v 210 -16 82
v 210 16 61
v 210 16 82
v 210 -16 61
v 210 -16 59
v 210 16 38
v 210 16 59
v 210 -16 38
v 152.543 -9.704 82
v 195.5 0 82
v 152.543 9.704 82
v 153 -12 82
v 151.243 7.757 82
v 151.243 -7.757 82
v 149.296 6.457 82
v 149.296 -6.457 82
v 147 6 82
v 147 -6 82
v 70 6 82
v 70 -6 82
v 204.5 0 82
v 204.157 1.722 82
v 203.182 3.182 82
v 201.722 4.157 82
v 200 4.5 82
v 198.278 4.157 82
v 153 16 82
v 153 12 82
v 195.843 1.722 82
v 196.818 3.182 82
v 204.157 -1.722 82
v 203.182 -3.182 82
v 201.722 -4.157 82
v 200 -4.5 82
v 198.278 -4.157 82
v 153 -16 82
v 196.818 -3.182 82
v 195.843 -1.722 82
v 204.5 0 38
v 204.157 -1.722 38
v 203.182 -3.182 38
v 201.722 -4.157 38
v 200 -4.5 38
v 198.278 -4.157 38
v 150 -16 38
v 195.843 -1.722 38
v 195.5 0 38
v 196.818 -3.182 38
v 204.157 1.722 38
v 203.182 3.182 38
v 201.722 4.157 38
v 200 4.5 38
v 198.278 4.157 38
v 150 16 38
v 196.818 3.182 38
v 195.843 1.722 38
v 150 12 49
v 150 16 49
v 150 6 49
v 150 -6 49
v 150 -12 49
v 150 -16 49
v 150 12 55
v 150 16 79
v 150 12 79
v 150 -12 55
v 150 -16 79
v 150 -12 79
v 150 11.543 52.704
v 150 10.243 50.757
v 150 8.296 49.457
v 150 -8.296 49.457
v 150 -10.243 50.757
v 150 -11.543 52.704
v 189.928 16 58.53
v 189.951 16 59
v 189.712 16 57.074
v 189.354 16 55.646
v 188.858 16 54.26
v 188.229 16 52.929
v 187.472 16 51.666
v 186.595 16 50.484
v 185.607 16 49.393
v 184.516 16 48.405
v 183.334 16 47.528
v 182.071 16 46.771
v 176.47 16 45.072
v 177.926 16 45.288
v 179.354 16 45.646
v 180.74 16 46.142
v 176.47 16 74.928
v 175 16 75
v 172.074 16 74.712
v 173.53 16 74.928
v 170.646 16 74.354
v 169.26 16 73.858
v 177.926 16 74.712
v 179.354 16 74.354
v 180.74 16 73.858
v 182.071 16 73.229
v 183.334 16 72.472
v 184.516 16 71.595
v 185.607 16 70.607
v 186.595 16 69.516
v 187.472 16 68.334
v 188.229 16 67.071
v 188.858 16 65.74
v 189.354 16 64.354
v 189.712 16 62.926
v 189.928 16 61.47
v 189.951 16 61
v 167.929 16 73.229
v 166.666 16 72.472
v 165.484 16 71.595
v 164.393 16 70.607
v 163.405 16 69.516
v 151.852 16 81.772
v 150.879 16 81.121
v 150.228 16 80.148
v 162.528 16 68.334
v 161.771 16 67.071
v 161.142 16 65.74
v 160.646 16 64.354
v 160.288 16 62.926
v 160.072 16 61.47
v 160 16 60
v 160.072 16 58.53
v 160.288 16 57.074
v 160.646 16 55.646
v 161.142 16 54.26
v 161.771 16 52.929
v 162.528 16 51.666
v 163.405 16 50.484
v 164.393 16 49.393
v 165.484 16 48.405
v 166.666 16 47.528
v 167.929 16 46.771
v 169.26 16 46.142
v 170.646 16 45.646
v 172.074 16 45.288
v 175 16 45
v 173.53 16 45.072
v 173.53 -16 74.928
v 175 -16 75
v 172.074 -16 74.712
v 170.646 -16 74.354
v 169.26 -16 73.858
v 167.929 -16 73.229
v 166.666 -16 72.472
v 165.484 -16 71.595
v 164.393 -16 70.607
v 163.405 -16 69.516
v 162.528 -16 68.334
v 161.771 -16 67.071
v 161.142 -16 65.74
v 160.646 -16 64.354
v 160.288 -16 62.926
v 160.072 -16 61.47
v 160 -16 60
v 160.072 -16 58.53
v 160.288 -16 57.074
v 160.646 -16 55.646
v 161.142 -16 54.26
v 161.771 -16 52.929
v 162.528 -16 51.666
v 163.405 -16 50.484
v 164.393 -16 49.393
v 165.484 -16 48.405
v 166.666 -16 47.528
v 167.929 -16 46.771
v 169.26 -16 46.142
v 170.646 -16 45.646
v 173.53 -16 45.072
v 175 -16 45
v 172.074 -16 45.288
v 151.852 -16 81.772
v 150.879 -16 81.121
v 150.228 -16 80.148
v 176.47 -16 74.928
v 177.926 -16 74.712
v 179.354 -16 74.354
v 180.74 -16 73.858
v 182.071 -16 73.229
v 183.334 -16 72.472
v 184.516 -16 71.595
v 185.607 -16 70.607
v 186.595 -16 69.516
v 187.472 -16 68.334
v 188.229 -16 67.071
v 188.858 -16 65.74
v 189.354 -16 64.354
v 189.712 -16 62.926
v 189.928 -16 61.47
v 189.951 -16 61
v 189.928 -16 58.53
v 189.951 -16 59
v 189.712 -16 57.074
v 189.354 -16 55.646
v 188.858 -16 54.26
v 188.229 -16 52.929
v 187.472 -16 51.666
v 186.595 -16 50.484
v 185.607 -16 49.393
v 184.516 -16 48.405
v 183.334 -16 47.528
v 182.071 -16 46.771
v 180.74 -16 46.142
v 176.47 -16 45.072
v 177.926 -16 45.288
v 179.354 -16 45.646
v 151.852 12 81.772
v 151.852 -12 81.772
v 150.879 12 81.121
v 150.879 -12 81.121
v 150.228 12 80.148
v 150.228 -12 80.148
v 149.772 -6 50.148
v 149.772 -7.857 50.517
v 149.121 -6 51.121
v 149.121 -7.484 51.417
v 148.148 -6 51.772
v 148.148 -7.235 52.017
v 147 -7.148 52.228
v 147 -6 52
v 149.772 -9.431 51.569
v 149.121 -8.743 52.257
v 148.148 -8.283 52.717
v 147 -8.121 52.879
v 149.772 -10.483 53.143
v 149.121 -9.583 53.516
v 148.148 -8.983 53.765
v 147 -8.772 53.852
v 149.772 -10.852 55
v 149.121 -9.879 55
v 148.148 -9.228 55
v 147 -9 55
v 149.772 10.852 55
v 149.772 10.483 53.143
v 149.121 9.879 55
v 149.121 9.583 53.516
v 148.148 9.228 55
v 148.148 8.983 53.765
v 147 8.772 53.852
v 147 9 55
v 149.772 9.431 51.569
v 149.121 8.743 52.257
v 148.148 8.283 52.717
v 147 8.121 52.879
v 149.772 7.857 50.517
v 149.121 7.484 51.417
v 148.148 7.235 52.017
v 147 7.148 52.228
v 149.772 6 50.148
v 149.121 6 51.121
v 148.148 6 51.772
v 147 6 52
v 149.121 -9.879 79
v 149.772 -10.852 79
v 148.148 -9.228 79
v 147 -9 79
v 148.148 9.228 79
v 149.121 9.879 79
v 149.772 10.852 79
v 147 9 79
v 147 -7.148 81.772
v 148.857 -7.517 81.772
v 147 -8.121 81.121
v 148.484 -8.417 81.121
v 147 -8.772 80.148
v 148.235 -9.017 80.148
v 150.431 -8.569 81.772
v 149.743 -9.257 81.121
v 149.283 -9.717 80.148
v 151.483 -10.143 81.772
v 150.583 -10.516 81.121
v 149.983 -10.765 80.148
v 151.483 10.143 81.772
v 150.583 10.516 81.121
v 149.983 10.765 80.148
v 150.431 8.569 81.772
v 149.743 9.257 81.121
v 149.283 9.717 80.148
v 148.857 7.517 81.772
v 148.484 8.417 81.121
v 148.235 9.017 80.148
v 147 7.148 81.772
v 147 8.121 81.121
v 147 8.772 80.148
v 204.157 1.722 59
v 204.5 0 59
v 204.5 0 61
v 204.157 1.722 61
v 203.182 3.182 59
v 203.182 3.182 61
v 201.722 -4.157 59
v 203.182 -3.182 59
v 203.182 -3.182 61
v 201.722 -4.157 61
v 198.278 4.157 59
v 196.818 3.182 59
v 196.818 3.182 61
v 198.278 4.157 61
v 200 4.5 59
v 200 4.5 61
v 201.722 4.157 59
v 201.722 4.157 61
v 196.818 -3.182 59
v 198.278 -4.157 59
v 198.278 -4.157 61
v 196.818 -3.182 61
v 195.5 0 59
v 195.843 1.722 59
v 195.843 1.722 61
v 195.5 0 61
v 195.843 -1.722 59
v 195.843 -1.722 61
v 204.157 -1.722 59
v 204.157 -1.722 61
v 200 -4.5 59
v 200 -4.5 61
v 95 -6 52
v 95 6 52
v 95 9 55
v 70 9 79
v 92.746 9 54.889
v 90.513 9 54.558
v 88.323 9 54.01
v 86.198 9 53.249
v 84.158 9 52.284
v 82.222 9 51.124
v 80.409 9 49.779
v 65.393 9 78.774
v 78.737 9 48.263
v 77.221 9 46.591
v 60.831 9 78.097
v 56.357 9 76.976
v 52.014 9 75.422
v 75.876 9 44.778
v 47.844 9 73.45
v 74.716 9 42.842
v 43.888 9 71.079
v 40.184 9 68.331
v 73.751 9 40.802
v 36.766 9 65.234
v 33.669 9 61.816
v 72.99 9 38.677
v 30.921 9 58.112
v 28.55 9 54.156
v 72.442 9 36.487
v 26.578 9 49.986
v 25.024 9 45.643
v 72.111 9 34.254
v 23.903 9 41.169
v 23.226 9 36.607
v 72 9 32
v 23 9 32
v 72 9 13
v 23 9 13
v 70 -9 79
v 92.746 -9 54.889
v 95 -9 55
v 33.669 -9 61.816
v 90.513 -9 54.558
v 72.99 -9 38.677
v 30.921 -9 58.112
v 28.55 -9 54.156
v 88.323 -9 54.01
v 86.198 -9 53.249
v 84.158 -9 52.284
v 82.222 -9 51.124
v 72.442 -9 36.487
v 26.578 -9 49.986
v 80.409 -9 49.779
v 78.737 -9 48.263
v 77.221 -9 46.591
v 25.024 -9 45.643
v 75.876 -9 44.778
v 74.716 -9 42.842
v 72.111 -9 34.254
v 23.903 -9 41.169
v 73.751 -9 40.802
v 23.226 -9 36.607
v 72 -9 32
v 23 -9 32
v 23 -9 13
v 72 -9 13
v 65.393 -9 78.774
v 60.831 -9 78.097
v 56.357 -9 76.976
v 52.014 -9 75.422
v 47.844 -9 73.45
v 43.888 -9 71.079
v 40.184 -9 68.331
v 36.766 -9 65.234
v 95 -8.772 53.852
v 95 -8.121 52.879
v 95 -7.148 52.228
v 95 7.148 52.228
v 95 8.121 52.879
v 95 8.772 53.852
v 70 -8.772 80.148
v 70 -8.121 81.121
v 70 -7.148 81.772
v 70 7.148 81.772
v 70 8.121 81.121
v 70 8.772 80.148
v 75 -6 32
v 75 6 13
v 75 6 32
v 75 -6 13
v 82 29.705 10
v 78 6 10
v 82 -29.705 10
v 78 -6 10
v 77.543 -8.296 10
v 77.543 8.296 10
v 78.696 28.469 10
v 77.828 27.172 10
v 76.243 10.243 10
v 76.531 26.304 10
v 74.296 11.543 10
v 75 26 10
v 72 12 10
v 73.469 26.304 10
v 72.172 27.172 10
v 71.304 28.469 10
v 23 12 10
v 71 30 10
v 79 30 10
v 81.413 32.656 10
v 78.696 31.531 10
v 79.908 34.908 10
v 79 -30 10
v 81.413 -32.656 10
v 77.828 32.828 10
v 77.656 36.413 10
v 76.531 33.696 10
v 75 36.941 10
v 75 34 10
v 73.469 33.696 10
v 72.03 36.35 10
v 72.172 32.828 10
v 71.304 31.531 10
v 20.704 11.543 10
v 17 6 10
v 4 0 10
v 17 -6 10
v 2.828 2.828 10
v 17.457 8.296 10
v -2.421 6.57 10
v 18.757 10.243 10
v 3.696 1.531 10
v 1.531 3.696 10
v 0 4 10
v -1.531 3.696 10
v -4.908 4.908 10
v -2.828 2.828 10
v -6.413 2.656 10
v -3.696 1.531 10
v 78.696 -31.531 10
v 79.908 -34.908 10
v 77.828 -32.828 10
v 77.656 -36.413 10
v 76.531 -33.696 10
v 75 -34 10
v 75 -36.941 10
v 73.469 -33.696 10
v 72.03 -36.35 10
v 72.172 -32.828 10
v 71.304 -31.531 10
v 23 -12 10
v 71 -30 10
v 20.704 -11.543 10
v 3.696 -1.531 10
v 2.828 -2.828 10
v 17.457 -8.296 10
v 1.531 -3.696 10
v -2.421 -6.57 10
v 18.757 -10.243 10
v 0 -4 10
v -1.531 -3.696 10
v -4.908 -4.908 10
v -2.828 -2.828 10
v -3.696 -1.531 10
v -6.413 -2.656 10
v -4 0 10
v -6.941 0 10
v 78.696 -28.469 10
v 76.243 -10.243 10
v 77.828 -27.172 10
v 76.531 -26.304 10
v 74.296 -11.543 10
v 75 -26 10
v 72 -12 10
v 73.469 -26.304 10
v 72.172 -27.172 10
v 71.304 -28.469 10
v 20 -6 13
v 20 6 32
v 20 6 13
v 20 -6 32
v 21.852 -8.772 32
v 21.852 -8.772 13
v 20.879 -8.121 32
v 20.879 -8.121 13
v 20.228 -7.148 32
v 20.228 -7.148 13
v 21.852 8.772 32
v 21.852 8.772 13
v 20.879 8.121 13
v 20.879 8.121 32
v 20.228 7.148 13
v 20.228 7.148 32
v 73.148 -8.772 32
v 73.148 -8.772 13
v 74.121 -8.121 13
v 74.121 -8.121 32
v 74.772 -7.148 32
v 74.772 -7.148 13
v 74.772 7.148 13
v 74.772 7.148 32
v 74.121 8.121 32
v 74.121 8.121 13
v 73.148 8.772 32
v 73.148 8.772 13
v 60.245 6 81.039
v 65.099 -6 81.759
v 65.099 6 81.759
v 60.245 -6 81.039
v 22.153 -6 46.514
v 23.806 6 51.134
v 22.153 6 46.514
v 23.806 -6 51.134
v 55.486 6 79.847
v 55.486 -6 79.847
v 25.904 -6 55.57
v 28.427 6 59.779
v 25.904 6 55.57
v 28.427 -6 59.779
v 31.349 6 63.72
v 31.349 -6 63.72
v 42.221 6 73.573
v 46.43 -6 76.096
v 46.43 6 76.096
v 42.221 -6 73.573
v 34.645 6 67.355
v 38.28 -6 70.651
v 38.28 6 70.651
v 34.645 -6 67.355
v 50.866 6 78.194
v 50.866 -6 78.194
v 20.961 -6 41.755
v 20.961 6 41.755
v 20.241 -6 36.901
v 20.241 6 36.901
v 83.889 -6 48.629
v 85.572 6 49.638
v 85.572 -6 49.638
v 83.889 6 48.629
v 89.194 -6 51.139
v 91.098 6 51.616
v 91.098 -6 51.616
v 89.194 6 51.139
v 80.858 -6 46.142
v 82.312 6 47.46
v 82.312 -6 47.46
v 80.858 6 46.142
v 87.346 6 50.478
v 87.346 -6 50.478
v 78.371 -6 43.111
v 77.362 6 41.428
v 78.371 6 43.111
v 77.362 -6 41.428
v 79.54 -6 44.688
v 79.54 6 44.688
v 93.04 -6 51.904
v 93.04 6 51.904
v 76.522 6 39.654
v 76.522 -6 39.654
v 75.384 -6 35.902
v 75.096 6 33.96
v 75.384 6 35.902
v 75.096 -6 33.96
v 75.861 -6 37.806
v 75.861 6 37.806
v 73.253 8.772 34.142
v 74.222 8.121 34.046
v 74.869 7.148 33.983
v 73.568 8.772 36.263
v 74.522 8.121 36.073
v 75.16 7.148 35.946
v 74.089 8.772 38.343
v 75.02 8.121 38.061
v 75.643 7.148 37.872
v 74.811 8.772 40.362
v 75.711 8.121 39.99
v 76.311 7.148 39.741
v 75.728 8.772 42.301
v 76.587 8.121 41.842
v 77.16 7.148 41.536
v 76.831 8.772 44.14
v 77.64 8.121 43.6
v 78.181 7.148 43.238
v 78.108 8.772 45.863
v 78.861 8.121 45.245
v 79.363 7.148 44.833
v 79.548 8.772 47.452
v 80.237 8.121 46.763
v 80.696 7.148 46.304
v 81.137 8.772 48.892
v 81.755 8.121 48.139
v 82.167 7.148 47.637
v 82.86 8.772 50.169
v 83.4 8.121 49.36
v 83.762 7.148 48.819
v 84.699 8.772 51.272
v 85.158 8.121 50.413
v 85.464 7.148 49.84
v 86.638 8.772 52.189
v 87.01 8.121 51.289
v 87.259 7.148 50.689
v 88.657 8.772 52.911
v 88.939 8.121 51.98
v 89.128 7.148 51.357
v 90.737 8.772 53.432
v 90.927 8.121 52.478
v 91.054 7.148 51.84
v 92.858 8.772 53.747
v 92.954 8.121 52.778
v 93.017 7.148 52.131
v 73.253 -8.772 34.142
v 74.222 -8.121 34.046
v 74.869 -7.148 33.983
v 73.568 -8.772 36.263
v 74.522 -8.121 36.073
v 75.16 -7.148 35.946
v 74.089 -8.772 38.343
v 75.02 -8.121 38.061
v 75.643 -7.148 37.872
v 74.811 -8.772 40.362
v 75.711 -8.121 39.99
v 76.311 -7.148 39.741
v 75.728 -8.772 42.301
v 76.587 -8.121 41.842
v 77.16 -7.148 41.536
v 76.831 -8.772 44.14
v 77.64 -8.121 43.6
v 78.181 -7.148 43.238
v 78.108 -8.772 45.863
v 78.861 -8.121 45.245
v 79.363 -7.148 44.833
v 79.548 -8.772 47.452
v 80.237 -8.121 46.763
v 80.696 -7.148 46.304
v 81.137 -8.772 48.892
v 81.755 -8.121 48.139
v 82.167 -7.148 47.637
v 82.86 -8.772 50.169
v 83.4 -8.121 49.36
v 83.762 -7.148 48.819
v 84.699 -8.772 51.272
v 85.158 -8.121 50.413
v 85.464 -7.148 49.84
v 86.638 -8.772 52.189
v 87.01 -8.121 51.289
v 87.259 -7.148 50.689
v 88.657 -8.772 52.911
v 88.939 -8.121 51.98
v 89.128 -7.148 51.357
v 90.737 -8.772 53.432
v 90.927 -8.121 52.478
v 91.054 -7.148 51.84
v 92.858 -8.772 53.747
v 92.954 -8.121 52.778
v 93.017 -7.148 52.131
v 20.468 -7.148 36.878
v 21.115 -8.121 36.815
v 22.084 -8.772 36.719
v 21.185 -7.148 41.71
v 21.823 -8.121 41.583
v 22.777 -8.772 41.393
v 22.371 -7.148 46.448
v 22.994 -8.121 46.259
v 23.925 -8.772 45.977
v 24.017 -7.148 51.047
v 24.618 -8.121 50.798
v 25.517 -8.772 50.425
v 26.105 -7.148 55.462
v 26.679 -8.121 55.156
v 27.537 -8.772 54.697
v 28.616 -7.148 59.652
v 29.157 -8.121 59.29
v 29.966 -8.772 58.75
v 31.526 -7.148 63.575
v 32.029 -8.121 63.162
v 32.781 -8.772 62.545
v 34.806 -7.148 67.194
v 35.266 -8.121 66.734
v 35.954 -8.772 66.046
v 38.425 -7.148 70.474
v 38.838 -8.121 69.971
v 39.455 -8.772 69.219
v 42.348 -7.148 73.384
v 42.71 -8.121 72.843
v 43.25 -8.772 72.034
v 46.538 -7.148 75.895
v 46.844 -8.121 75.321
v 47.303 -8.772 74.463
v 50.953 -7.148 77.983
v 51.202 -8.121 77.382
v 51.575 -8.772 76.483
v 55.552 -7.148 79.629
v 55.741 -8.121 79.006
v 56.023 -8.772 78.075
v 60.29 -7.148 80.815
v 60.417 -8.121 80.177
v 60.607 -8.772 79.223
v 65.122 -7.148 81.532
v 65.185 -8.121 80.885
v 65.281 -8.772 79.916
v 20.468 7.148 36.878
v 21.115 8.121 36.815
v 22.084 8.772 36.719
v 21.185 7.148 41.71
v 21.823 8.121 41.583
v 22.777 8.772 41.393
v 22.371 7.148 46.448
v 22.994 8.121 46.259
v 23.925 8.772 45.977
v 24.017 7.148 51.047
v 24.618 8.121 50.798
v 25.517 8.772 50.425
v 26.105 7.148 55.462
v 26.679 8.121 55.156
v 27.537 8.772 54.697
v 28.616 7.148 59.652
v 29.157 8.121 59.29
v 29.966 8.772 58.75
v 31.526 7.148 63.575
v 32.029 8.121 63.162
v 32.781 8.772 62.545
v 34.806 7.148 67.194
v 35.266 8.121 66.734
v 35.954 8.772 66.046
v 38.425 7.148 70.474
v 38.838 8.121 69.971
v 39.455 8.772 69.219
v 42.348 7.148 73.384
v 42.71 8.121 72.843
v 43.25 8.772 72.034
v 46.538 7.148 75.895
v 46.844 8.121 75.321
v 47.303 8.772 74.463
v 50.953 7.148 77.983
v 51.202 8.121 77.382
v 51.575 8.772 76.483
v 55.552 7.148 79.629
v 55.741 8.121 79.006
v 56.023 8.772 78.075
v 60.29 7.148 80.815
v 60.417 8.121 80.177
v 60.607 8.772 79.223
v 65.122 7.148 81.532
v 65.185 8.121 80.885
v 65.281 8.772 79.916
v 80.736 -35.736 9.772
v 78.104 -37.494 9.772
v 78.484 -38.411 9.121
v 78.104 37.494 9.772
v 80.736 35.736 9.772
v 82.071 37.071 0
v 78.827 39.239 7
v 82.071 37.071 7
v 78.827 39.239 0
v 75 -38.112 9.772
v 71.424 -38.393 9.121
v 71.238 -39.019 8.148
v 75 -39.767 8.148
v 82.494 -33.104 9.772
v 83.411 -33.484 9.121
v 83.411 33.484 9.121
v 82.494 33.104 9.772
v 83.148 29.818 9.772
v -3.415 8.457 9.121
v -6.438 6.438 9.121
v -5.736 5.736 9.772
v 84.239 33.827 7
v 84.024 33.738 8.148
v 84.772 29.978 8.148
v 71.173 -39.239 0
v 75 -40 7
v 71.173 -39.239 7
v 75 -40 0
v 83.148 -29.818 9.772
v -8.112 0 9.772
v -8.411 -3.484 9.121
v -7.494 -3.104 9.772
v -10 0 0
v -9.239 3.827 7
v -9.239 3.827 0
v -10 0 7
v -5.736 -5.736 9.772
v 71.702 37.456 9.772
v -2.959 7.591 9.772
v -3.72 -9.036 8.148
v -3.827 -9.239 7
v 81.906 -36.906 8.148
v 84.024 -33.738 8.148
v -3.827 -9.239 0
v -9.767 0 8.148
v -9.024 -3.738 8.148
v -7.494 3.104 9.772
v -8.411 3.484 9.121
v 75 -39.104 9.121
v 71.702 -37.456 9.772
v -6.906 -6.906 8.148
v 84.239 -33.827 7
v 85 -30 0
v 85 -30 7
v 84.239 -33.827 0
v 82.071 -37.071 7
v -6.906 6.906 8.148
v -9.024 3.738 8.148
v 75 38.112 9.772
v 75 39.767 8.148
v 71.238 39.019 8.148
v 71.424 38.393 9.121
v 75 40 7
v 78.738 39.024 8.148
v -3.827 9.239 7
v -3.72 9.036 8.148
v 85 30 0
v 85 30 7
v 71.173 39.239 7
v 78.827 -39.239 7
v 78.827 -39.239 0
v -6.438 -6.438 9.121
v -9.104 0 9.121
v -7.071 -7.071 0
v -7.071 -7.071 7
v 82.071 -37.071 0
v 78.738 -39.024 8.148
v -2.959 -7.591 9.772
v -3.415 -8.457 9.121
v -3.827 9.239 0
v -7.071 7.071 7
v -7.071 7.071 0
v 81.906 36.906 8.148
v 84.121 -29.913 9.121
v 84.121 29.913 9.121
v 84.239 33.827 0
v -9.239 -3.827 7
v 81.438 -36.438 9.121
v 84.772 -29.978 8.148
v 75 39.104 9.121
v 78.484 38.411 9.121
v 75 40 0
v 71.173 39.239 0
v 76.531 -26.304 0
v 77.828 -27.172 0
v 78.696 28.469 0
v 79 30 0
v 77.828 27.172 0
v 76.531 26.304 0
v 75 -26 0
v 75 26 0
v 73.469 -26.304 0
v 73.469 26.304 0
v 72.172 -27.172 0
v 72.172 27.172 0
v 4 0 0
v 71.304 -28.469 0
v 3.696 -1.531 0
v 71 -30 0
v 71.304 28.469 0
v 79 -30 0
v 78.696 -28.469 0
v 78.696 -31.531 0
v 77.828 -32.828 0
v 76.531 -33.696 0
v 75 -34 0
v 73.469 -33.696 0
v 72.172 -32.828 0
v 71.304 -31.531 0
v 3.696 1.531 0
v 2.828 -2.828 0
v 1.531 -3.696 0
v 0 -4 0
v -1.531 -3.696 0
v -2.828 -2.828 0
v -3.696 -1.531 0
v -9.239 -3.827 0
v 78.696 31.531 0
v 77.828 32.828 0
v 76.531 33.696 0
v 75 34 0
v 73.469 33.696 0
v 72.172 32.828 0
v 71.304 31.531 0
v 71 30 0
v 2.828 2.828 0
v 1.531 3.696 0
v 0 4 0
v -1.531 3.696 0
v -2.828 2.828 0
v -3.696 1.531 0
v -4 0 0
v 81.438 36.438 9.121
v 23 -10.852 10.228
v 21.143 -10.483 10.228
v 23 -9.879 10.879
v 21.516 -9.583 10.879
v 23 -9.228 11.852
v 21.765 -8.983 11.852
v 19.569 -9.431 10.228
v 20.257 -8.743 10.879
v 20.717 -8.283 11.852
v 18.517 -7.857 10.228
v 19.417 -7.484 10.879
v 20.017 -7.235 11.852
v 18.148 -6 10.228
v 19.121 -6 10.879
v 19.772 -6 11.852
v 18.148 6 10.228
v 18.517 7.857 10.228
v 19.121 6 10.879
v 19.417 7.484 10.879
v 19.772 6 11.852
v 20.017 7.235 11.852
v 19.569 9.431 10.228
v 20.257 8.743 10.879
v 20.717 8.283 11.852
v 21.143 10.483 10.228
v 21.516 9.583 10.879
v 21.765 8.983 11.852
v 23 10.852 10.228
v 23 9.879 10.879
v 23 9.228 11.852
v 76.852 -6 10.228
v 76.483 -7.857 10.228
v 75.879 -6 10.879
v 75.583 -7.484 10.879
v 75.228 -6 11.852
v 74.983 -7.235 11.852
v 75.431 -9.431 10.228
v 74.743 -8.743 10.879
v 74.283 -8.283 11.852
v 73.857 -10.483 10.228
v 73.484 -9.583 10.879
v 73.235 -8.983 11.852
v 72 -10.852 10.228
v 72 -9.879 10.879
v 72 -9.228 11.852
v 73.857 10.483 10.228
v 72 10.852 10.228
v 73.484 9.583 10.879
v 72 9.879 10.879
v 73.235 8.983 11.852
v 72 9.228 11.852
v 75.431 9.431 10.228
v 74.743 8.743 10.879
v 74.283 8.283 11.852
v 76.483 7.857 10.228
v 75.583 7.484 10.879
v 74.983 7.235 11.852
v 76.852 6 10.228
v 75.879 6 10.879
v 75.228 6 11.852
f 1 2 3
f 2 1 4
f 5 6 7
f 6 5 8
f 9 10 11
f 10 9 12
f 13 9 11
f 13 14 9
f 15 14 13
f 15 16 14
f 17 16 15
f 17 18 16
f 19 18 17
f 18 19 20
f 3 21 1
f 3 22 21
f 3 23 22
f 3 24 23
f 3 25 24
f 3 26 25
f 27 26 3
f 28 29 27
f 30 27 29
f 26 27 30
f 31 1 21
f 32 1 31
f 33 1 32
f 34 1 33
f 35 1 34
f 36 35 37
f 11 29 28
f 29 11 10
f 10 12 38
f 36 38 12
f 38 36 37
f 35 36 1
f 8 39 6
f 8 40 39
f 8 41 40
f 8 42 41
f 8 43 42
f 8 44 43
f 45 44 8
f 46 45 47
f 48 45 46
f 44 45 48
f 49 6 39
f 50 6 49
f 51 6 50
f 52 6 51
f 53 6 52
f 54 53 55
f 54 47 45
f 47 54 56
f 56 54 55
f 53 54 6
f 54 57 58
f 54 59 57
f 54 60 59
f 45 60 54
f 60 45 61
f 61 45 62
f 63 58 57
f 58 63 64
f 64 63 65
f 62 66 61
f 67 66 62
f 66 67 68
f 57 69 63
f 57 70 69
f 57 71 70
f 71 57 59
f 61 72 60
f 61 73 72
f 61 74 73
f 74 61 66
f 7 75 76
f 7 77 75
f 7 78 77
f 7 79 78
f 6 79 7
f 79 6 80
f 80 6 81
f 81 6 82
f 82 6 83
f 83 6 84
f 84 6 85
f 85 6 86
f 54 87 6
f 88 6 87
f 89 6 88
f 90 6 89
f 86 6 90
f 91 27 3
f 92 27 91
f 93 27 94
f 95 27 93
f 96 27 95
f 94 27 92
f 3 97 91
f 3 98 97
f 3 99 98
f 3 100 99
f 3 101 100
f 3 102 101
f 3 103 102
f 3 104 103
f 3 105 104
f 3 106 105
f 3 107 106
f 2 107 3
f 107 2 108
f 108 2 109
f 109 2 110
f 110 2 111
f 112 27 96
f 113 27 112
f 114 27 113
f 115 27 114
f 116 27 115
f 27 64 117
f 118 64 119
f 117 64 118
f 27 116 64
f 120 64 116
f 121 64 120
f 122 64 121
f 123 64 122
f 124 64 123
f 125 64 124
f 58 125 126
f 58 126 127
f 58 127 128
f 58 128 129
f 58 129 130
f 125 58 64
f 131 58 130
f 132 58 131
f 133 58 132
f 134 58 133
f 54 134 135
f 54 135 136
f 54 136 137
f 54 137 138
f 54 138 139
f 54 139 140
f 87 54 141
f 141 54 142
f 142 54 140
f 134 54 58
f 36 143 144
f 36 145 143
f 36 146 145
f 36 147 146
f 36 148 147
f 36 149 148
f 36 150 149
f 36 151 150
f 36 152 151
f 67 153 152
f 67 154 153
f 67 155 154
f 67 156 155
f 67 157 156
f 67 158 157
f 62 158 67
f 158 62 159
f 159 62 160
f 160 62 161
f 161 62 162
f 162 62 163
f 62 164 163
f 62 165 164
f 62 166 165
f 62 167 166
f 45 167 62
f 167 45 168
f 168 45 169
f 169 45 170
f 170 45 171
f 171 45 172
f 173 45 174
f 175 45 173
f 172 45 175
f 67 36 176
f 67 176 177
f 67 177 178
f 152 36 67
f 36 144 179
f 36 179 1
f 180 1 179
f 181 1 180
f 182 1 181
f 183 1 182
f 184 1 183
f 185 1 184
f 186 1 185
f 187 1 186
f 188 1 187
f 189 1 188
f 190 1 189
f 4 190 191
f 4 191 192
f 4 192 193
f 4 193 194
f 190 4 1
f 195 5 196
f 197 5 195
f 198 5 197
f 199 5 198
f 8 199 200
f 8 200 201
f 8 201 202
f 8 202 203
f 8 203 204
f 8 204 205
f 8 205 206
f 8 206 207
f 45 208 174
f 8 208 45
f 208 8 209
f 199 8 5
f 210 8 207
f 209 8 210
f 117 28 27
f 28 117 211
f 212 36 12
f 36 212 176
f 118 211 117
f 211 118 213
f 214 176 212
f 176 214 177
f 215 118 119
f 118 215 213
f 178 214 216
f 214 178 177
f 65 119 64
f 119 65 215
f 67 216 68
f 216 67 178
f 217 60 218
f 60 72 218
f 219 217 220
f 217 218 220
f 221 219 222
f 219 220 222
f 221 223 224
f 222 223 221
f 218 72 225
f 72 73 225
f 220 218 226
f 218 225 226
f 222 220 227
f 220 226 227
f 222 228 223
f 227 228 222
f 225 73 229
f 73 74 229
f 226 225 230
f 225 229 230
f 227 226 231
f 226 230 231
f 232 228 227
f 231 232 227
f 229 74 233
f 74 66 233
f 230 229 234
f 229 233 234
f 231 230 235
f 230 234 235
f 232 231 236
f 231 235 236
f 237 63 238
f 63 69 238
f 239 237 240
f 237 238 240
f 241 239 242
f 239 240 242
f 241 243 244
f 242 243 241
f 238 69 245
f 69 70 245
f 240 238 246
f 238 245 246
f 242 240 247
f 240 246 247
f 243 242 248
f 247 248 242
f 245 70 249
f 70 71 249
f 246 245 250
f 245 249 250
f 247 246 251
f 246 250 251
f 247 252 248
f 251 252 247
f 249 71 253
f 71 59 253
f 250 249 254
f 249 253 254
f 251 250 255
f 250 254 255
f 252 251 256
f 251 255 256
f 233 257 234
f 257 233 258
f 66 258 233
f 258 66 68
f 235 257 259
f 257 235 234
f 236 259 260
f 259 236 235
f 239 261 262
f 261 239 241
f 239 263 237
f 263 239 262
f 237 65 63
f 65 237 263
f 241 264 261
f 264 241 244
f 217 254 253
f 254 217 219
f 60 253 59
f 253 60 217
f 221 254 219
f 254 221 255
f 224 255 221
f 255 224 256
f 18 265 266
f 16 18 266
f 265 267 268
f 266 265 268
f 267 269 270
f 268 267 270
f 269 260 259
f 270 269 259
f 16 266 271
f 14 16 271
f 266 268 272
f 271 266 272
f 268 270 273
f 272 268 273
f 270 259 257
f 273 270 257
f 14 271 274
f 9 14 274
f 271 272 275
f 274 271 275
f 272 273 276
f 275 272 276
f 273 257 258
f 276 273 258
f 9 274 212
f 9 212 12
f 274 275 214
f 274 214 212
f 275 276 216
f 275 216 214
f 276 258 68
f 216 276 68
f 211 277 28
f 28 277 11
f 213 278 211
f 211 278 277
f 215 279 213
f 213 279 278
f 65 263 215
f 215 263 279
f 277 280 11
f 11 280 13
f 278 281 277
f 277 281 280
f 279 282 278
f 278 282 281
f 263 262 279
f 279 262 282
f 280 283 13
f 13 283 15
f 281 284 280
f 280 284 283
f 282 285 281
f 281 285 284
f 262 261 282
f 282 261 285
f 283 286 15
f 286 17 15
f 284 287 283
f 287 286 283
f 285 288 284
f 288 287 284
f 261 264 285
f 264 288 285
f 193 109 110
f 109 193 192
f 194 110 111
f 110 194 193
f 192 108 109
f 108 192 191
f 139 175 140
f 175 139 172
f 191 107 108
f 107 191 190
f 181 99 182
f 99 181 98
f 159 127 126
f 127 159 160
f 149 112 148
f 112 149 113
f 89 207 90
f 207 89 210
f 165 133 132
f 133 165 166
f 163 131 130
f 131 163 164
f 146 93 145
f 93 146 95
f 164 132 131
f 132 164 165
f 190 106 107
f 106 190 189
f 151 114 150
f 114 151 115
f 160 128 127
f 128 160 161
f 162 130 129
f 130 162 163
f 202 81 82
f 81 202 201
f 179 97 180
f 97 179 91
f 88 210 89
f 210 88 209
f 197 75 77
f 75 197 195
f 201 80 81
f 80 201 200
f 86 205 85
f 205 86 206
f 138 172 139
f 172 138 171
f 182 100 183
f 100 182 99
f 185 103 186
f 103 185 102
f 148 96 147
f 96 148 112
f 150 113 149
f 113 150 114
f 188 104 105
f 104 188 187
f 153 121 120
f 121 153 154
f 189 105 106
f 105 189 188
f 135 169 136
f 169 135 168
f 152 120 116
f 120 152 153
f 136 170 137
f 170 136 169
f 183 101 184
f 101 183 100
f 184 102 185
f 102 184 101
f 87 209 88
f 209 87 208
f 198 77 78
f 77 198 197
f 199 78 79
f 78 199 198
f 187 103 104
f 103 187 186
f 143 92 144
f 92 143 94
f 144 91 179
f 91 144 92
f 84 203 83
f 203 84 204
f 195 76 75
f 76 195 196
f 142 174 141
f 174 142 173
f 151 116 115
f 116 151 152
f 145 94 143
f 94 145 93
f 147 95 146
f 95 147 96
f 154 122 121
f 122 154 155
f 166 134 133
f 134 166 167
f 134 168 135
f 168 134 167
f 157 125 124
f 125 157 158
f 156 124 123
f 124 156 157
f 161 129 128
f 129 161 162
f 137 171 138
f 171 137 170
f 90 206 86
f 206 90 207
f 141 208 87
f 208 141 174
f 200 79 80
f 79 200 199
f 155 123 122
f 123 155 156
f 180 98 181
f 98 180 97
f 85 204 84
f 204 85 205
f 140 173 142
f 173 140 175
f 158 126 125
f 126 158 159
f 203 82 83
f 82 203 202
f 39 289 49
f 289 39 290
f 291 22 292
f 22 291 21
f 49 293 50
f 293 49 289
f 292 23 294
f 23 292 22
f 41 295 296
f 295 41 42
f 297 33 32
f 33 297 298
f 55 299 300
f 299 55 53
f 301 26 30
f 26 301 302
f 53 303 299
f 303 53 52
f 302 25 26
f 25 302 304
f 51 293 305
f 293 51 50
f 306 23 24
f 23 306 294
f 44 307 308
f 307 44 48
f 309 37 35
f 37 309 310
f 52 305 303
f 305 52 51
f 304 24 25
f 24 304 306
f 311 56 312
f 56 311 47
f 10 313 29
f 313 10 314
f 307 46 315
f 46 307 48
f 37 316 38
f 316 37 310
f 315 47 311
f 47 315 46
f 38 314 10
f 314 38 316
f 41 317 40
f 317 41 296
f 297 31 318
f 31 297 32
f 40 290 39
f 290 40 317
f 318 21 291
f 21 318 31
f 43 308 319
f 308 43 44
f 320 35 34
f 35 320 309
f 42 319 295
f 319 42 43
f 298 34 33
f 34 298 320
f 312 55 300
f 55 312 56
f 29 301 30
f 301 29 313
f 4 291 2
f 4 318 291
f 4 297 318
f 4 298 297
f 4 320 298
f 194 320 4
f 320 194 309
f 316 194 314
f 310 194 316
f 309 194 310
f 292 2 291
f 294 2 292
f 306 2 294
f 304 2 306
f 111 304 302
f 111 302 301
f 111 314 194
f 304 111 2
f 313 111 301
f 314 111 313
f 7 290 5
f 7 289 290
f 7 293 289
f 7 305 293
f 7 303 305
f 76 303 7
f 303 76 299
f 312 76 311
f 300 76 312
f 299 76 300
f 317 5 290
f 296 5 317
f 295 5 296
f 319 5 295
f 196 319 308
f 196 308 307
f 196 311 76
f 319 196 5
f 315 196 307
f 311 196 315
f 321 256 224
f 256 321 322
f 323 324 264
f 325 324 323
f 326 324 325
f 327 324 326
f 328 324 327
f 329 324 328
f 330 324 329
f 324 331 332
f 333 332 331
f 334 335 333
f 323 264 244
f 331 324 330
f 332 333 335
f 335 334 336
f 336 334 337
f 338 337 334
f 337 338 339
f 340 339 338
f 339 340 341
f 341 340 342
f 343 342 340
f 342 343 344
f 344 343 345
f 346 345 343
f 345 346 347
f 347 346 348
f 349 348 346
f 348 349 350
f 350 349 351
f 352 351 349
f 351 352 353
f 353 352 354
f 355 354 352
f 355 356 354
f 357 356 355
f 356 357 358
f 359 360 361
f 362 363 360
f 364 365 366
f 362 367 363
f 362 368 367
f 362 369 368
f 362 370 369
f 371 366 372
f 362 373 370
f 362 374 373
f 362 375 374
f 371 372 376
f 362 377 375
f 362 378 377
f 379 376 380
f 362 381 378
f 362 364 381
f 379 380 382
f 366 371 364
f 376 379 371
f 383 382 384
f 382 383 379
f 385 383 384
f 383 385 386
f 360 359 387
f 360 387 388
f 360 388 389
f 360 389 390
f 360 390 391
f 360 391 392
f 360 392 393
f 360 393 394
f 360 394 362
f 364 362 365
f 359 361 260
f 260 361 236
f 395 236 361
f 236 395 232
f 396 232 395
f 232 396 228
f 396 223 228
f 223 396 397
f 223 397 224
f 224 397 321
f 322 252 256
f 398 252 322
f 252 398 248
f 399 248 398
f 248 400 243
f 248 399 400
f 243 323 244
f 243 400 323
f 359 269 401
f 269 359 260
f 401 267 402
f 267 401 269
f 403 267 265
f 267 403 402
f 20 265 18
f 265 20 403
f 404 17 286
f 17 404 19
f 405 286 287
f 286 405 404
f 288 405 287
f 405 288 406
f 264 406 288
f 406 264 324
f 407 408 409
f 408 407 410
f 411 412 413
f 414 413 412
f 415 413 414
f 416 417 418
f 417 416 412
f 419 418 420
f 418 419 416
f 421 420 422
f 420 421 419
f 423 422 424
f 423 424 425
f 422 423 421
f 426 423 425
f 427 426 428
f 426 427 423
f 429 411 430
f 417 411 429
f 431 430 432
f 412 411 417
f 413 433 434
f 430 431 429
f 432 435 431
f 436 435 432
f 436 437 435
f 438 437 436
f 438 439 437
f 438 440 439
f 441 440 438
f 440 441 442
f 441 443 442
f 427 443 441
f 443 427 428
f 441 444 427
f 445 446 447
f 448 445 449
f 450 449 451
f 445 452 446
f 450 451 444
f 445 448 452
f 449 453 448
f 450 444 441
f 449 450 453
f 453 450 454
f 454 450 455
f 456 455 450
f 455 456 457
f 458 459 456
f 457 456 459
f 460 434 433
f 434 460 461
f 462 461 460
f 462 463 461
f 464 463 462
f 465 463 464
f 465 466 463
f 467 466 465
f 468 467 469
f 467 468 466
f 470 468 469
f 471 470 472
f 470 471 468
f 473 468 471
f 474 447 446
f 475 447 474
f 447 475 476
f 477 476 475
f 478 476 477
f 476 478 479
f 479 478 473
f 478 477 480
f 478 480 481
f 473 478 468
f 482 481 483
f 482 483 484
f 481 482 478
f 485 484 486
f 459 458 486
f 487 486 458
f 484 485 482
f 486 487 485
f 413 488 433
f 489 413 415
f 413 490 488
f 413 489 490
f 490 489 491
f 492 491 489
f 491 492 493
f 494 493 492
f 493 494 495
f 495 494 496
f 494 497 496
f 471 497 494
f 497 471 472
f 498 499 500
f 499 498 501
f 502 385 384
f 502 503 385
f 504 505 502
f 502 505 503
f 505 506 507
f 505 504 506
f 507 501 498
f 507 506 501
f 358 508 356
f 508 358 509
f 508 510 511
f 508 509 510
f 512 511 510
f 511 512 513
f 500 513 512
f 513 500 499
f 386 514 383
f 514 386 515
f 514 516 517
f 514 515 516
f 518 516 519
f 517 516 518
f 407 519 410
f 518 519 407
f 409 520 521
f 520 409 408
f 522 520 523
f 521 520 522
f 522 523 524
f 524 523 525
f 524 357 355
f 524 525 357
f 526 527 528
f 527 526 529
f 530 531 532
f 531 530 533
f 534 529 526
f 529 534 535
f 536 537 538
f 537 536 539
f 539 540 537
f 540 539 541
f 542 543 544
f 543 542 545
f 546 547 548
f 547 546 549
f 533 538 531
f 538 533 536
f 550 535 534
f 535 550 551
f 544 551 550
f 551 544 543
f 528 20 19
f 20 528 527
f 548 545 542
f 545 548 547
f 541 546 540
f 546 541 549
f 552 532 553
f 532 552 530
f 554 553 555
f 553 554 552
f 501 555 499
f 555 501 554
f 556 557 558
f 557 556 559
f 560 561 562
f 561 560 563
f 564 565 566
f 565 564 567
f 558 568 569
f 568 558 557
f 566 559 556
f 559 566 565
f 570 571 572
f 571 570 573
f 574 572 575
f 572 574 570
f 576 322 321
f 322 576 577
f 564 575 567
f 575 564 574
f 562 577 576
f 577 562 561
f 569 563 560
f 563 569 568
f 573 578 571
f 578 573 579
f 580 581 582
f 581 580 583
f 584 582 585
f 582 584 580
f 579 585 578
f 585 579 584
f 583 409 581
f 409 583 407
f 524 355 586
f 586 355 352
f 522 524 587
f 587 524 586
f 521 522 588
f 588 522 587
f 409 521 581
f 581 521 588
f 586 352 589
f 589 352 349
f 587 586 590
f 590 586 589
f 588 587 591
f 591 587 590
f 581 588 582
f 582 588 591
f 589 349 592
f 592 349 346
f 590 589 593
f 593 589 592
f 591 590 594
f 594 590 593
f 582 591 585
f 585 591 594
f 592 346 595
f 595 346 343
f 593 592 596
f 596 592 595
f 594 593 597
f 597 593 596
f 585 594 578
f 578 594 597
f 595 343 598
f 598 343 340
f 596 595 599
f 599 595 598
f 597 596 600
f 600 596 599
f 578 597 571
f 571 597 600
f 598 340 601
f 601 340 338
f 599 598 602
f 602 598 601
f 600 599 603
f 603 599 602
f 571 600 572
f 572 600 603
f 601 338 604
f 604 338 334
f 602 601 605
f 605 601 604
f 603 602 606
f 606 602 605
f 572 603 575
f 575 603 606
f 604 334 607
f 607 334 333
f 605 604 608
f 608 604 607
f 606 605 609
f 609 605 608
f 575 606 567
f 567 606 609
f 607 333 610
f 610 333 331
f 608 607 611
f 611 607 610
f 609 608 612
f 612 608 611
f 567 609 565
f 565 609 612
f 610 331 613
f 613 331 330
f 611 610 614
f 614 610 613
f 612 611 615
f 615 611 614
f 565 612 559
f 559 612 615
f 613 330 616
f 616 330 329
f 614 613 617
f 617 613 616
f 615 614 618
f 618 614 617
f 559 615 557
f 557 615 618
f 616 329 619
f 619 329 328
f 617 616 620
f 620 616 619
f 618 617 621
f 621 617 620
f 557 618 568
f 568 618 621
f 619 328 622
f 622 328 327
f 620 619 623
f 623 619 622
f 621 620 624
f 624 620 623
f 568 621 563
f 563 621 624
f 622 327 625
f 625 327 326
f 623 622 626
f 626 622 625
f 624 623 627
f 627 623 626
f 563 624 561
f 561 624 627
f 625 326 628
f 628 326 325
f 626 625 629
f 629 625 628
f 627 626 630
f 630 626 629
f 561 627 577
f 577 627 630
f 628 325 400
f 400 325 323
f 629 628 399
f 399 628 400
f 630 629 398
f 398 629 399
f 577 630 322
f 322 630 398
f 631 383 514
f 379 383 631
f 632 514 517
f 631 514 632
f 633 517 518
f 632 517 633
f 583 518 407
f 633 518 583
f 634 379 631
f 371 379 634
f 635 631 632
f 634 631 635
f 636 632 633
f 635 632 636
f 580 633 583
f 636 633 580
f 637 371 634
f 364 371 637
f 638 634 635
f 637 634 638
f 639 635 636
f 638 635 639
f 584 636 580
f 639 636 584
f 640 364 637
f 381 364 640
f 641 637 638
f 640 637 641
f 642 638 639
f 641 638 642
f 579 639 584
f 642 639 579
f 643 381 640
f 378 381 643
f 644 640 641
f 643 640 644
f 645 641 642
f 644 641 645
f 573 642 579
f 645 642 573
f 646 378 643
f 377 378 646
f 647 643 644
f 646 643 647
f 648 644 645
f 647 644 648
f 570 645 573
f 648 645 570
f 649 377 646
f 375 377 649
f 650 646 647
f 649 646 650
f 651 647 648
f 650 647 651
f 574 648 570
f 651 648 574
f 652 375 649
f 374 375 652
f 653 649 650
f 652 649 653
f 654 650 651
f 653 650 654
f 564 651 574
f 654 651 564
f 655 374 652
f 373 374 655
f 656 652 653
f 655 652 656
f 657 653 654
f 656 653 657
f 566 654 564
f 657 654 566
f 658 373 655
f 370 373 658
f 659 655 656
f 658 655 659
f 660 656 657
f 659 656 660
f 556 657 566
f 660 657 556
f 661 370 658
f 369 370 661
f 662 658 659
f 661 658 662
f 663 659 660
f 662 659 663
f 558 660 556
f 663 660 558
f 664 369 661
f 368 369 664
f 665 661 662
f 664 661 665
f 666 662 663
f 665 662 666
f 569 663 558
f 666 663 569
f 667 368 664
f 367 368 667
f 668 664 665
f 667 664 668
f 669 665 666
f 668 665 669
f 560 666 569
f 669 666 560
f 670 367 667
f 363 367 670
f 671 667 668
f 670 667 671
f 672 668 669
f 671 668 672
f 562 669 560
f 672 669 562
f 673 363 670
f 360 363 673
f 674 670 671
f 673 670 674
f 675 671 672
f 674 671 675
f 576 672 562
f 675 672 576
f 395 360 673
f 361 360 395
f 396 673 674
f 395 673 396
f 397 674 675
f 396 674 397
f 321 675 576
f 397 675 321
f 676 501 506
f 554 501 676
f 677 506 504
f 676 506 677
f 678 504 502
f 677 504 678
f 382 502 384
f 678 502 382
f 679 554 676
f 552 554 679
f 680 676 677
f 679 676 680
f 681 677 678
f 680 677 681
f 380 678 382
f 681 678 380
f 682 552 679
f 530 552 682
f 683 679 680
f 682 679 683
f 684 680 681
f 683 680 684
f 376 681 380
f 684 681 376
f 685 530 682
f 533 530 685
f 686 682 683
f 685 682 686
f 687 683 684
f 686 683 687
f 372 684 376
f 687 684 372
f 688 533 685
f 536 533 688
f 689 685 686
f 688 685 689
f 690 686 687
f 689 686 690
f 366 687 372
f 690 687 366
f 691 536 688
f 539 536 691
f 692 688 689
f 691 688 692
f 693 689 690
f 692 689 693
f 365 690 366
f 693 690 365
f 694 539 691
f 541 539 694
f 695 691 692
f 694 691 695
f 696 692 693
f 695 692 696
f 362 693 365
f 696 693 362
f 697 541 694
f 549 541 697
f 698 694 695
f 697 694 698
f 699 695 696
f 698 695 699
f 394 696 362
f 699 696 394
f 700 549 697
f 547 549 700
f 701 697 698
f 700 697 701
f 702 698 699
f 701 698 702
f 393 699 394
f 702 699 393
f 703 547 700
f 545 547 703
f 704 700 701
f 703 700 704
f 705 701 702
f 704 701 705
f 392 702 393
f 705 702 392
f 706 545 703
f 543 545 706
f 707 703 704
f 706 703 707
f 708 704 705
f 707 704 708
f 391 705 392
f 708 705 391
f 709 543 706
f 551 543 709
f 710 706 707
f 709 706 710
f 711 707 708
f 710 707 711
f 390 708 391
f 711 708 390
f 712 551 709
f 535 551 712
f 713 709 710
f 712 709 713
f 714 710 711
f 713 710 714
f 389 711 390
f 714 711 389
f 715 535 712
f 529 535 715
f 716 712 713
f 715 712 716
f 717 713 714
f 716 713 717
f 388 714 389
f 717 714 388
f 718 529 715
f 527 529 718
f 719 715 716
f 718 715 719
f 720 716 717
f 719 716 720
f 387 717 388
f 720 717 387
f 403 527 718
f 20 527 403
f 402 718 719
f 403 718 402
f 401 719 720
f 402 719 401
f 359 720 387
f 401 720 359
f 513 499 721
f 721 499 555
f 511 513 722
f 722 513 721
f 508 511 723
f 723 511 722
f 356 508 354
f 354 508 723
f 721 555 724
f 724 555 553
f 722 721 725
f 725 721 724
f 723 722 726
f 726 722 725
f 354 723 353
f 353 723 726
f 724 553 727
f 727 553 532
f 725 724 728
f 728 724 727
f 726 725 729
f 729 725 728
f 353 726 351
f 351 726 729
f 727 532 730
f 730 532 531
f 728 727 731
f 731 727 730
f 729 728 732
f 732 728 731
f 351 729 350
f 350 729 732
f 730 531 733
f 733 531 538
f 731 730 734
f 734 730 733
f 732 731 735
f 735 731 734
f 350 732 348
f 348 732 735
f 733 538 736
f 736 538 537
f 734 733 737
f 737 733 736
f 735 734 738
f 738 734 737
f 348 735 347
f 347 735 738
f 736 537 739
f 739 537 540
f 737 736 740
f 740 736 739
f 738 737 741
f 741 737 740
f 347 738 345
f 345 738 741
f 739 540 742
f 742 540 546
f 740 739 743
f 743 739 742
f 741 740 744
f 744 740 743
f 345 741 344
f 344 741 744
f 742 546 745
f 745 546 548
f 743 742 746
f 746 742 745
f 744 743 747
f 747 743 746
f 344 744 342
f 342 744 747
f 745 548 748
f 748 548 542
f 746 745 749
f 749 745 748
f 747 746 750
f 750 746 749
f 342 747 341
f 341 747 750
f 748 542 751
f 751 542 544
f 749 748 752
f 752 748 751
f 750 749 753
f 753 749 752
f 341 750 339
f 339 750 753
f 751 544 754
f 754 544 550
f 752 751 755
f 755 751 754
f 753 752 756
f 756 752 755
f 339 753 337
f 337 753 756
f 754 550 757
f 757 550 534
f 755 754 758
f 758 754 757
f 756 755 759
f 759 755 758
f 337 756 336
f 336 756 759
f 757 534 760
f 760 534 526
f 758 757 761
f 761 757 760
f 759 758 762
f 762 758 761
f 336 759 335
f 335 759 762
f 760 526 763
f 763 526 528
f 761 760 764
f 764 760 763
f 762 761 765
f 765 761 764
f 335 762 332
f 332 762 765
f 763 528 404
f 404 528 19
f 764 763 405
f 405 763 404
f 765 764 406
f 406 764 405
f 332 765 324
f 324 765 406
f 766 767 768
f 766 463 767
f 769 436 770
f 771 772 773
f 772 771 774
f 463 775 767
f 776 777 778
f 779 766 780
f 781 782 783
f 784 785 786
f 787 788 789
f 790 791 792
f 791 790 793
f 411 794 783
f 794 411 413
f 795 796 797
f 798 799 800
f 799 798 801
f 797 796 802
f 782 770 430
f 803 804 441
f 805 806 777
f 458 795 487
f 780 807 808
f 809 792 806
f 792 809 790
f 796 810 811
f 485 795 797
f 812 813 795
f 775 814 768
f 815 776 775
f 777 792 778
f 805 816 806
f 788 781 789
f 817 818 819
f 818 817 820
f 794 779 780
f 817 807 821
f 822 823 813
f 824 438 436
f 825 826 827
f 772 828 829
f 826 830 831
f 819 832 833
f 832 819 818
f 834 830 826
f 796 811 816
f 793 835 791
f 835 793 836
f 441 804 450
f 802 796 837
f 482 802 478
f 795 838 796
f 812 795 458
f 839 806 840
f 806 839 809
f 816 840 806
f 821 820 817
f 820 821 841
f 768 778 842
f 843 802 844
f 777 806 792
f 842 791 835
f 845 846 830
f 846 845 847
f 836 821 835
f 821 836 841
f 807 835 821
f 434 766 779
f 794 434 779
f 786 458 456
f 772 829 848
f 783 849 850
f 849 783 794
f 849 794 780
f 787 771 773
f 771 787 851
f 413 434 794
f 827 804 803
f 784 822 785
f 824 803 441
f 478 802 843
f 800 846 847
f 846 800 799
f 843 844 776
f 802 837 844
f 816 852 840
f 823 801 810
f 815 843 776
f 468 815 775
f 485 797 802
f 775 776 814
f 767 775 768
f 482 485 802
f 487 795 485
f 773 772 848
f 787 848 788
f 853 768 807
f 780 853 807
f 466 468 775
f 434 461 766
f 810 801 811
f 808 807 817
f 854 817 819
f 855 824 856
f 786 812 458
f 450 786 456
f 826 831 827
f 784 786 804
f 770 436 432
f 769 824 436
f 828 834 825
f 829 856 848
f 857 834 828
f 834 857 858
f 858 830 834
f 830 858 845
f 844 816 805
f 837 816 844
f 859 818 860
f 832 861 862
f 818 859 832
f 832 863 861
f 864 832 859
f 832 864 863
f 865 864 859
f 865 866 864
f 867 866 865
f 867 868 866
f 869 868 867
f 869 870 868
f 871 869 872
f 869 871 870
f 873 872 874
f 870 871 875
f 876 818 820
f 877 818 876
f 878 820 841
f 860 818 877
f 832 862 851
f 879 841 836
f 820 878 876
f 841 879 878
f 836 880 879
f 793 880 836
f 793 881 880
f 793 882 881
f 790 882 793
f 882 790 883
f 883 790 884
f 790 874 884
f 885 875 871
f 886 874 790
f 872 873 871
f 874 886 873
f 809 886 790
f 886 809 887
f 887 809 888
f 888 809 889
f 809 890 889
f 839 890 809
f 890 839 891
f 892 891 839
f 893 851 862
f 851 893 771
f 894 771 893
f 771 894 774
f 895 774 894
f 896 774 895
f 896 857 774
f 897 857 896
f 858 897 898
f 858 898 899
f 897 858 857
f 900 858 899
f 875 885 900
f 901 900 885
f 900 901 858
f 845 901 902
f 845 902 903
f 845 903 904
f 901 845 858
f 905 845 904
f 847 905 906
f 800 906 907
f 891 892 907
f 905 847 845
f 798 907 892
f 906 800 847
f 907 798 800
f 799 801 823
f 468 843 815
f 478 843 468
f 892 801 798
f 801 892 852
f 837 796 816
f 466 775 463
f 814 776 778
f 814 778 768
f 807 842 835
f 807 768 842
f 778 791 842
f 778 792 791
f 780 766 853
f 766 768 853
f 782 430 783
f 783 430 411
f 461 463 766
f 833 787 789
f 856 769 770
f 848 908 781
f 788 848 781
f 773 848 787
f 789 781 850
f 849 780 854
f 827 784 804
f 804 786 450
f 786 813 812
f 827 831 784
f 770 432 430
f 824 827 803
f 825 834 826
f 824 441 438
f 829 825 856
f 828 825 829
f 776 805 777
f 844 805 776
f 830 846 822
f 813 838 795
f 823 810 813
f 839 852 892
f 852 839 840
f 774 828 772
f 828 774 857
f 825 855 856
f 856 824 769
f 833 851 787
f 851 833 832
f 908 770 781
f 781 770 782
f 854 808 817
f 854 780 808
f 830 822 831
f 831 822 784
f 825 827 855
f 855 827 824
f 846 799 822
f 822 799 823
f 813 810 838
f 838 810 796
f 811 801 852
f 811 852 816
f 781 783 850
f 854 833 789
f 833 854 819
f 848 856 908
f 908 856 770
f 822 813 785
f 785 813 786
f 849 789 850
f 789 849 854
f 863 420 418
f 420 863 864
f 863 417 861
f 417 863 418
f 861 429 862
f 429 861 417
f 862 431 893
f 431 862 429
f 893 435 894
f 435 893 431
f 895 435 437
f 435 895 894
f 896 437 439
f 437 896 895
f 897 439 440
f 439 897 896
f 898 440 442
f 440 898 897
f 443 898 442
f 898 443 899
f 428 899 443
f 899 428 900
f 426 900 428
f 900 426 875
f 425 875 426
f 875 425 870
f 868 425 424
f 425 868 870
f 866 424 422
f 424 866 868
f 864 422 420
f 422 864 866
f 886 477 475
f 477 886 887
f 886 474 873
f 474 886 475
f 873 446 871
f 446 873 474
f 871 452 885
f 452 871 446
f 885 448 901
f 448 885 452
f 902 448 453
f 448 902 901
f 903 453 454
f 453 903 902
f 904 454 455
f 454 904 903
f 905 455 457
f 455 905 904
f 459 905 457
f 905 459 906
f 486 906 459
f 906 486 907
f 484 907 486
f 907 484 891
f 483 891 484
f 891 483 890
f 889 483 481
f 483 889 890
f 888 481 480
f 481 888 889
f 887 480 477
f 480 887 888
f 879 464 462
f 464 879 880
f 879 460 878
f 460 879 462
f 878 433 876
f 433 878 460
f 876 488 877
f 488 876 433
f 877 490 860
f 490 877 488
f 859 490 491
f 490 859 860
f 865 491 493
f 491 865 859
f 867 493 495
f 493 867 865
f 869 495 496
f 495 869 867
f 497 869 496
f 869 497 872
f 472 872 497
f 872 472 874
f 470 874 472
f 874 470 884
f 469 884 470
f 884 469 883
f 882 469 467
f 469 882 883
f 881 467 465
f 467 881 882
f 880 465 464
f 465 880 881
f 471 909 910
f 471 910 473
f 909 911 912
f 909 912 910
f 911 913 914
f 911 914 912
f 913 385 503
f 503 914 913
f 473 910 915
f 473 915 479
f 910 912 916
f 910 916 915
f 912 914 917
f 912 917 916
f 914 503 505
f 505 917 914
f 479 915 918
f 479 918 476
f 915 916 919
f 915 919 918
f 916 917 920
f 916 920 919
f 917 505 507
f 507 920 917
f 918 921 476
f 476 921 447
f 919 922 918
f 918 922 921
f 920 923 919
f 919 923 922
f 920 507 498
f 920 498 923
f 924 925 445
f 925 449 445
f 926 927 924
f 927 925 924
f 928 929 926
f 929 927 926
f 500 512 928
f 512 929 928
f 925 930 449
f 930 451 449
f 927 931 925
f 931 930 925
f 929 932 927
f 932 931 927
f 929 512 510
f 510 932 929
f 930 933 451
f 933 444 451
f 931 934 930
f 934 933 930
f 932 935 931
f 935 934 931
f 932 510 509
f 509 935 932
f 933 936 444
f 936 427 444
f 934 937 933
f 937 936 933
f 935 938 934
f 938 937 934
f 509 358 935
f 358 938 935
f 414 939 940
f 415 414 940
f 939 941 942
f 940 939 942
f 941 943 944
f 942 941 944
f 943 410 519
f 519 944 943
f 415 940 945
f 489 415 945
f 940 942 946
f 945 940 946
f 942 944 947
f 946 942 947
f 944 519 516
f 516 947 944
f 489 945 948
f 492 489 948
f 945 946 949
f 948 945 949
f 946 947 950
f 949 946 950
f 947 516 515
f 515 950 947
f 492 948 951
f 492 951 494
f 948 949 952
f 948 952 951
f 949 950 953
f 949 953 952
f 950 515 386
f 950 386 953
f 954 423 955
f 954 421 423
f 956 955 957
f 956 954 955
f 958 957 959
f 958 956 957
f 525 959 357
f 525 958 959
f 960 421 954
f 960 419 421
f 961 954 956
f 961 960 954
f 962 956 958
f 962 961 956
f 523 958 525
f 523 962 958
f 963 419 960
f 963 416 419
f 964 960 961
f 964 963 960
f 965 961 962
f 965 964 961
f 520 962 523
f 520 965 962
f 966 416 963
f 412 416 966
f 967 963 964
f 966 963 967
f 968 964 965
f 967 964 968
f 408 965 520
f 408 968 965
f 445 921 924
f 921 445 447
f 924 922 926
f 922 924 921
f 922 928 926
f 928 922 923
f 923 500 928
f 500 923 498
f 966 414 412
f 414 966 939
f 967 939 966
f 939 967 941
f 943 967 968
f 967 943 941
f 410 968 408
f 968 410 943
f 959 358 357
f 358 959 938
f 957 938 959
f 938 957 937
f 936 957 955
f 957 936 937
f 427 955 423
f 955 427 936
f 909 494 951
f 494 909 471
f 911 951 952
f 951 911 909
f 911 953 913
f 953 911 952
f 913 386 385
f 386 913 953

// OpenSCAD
$fn=16;
main();
module main(){
color("lightgrey")
    {
        head();
        arm();
        foot();
    }
}


module head()
{
difference(){ 
union(){ 
    translate([150,-6,38+17])mirror([1,0,1])ocorner(3);//trim
    translate([150, 6,38+17])mirror([1,0,1])ocorner(3);//trim
    translate([147,-12,38+14+3])cube([7,18+6,27]);//trim
    translate([147,-6,38+11])cube([7,18-6,33]);//trim    
        difference(){ 
            translate([150,-16,38])cube([60,32,44]); 
            translate([150,0,38+44])mirror([0,0,0])mirror([0,-1,-1])
        otrim(34);//trim
        }

}

    translate([147,-12,38+11])cylinder(44,3,3);//trim
    translate([147,12,38+11])cylinder(44,3,3);//trim
    translate([147, 0,38+11]) rotate([90,0,0]) 
        cylinder(44,3,3,center=true);//trim 
    translate([147,-12,38+44])mirror([0,0,1]) 
        ocorner(3);//trim
    translate([147, 12,38+44])mirror([0,0,1]) 
        ocorner(3);//trim 
    translate([175, 0,38+22])rotate([90,0,0])
         cylinder(44,15,15,center=true,$fn=64);//trim
    translate([200, 0,38+22])rotate([0,0,0]) 
        cylinder(45,4.5,4.5,center=true,$fn=16);//trim
    translate([200, 0,38+22])rotate([0,0,0]) 
        cylinder(2,30,30,center=true,$fn=16);//trim

   }  
}
module arm()
{   
difference(){ 
        translate([70,-9,38+14])cube([80,18,30]);
//trim
 translate([110,-9,52])mirror([0,0,1])mirror([1,0,1])otrim(81);      
 translate([110,9,52])mirror([0,1,-1])mirror([1,0,1])otrim(81);  
 translate([110,-9,82])mirror([0,0,1])mirror([1,0,-1])otrim(81);      
 translate([110,9,82])mirror([0,1,1])mirror([1,0,-1])otrim(81);  
 

   }   
difference(){   
        translate([20,-9,10])cube([55,18,22]);  
//trim 
 translate([20,-9,15])mirror([0,0,0])otrim(36);      
 translate([20,9,15])mirror([0,1,0])otrim(36);  
 translate([75,-9,15])mirror([1,0,0])otrim(36);  
 translate([75,9,15])mirror([1,1,0])otrim(36);  

 }   

    intersection()
    {
        translate([20,-9,32])cube([75,18,50]);
        difference(){   translate([70,0,32]) rotate([90,0,0])
            cylinder(18,50,50,center=true,$fn=64);
                        translate([95,0,32]) rotate([90,0,0])
            cylinder(19,20,20,center=true,$fn=64);
//trim
mirror([0,0,0])translate([95,9,32]) rotate([90,0,0])ocorner32(20);
mirror([0,1,0])translate([95,9,32]) rotate([90,0,0])ocorner32(20);
mirror([0,1,0])translate([70,9,32]) rotate([90,0,0])ocorner32(-55+5);
mirror([0,0,0])translate([70,9,32]) rotate([90,0,0])ocorner32(-55+5);


 }
    }
}

module foot(){
    difference(){
        hull(){ for(i=[0:1/4:1]){
        y=cos(i*90)*3; x=-3+sin(i*90)*3;
        translate([0,0,0]) linear_extrude(7+y) offset( x)footP();
        } }
        translate([0,0,-0.005])linear_extrude(10.01){
        circle(4); 
        translate([75,-30])circle(4); 
        translate([75,30]) circle(4);} 
    }
//trim
 translate([20+3,-9+3,10])ocorner(3);
 translate([20+3,9-3,10])ocorner(3);
 translate([75-3,-9+3,10])ocorner(3);
 translate([75-3,9-3,10])ocorner(3);
 translate([20,0,10])mirror([1,0,0])mirror([0,-1,1])otrim(12);
 translate([75,0,10])               mirror([0,-1,1])otrim(12);
 translate([20+55/2,9,10])mirror([0,0,1])mirror([1,0,1])otrim(55-6);
 translate([20+55/2,-9,10])mirror([0,-1,1])mirror([1,0,1])otrim(55-6);}

 module footP(){
    hull()
    {
        circle(10);
        translate([75,-30])circle(10);
        translate([75,30])circle(10);
    }
}


module quarterround(){ 
difference()
{
    translate([-1,-1]) square([4,4]);
    translate([3,3])circle(3,$fn=16);
}}

module ocorner(r)
{
rotate_extrude ($fn=16,convexity=20)translate([r,0])quarterround();
}
module ocorner32(r)
{
rotate_extrude ($fn=64,convexity=20)translate([r,0])quarterround();
}
module otrim(l)
{
linear_extrude (l,center=true,convexity=20)translate([0,0])quarterround();
}
